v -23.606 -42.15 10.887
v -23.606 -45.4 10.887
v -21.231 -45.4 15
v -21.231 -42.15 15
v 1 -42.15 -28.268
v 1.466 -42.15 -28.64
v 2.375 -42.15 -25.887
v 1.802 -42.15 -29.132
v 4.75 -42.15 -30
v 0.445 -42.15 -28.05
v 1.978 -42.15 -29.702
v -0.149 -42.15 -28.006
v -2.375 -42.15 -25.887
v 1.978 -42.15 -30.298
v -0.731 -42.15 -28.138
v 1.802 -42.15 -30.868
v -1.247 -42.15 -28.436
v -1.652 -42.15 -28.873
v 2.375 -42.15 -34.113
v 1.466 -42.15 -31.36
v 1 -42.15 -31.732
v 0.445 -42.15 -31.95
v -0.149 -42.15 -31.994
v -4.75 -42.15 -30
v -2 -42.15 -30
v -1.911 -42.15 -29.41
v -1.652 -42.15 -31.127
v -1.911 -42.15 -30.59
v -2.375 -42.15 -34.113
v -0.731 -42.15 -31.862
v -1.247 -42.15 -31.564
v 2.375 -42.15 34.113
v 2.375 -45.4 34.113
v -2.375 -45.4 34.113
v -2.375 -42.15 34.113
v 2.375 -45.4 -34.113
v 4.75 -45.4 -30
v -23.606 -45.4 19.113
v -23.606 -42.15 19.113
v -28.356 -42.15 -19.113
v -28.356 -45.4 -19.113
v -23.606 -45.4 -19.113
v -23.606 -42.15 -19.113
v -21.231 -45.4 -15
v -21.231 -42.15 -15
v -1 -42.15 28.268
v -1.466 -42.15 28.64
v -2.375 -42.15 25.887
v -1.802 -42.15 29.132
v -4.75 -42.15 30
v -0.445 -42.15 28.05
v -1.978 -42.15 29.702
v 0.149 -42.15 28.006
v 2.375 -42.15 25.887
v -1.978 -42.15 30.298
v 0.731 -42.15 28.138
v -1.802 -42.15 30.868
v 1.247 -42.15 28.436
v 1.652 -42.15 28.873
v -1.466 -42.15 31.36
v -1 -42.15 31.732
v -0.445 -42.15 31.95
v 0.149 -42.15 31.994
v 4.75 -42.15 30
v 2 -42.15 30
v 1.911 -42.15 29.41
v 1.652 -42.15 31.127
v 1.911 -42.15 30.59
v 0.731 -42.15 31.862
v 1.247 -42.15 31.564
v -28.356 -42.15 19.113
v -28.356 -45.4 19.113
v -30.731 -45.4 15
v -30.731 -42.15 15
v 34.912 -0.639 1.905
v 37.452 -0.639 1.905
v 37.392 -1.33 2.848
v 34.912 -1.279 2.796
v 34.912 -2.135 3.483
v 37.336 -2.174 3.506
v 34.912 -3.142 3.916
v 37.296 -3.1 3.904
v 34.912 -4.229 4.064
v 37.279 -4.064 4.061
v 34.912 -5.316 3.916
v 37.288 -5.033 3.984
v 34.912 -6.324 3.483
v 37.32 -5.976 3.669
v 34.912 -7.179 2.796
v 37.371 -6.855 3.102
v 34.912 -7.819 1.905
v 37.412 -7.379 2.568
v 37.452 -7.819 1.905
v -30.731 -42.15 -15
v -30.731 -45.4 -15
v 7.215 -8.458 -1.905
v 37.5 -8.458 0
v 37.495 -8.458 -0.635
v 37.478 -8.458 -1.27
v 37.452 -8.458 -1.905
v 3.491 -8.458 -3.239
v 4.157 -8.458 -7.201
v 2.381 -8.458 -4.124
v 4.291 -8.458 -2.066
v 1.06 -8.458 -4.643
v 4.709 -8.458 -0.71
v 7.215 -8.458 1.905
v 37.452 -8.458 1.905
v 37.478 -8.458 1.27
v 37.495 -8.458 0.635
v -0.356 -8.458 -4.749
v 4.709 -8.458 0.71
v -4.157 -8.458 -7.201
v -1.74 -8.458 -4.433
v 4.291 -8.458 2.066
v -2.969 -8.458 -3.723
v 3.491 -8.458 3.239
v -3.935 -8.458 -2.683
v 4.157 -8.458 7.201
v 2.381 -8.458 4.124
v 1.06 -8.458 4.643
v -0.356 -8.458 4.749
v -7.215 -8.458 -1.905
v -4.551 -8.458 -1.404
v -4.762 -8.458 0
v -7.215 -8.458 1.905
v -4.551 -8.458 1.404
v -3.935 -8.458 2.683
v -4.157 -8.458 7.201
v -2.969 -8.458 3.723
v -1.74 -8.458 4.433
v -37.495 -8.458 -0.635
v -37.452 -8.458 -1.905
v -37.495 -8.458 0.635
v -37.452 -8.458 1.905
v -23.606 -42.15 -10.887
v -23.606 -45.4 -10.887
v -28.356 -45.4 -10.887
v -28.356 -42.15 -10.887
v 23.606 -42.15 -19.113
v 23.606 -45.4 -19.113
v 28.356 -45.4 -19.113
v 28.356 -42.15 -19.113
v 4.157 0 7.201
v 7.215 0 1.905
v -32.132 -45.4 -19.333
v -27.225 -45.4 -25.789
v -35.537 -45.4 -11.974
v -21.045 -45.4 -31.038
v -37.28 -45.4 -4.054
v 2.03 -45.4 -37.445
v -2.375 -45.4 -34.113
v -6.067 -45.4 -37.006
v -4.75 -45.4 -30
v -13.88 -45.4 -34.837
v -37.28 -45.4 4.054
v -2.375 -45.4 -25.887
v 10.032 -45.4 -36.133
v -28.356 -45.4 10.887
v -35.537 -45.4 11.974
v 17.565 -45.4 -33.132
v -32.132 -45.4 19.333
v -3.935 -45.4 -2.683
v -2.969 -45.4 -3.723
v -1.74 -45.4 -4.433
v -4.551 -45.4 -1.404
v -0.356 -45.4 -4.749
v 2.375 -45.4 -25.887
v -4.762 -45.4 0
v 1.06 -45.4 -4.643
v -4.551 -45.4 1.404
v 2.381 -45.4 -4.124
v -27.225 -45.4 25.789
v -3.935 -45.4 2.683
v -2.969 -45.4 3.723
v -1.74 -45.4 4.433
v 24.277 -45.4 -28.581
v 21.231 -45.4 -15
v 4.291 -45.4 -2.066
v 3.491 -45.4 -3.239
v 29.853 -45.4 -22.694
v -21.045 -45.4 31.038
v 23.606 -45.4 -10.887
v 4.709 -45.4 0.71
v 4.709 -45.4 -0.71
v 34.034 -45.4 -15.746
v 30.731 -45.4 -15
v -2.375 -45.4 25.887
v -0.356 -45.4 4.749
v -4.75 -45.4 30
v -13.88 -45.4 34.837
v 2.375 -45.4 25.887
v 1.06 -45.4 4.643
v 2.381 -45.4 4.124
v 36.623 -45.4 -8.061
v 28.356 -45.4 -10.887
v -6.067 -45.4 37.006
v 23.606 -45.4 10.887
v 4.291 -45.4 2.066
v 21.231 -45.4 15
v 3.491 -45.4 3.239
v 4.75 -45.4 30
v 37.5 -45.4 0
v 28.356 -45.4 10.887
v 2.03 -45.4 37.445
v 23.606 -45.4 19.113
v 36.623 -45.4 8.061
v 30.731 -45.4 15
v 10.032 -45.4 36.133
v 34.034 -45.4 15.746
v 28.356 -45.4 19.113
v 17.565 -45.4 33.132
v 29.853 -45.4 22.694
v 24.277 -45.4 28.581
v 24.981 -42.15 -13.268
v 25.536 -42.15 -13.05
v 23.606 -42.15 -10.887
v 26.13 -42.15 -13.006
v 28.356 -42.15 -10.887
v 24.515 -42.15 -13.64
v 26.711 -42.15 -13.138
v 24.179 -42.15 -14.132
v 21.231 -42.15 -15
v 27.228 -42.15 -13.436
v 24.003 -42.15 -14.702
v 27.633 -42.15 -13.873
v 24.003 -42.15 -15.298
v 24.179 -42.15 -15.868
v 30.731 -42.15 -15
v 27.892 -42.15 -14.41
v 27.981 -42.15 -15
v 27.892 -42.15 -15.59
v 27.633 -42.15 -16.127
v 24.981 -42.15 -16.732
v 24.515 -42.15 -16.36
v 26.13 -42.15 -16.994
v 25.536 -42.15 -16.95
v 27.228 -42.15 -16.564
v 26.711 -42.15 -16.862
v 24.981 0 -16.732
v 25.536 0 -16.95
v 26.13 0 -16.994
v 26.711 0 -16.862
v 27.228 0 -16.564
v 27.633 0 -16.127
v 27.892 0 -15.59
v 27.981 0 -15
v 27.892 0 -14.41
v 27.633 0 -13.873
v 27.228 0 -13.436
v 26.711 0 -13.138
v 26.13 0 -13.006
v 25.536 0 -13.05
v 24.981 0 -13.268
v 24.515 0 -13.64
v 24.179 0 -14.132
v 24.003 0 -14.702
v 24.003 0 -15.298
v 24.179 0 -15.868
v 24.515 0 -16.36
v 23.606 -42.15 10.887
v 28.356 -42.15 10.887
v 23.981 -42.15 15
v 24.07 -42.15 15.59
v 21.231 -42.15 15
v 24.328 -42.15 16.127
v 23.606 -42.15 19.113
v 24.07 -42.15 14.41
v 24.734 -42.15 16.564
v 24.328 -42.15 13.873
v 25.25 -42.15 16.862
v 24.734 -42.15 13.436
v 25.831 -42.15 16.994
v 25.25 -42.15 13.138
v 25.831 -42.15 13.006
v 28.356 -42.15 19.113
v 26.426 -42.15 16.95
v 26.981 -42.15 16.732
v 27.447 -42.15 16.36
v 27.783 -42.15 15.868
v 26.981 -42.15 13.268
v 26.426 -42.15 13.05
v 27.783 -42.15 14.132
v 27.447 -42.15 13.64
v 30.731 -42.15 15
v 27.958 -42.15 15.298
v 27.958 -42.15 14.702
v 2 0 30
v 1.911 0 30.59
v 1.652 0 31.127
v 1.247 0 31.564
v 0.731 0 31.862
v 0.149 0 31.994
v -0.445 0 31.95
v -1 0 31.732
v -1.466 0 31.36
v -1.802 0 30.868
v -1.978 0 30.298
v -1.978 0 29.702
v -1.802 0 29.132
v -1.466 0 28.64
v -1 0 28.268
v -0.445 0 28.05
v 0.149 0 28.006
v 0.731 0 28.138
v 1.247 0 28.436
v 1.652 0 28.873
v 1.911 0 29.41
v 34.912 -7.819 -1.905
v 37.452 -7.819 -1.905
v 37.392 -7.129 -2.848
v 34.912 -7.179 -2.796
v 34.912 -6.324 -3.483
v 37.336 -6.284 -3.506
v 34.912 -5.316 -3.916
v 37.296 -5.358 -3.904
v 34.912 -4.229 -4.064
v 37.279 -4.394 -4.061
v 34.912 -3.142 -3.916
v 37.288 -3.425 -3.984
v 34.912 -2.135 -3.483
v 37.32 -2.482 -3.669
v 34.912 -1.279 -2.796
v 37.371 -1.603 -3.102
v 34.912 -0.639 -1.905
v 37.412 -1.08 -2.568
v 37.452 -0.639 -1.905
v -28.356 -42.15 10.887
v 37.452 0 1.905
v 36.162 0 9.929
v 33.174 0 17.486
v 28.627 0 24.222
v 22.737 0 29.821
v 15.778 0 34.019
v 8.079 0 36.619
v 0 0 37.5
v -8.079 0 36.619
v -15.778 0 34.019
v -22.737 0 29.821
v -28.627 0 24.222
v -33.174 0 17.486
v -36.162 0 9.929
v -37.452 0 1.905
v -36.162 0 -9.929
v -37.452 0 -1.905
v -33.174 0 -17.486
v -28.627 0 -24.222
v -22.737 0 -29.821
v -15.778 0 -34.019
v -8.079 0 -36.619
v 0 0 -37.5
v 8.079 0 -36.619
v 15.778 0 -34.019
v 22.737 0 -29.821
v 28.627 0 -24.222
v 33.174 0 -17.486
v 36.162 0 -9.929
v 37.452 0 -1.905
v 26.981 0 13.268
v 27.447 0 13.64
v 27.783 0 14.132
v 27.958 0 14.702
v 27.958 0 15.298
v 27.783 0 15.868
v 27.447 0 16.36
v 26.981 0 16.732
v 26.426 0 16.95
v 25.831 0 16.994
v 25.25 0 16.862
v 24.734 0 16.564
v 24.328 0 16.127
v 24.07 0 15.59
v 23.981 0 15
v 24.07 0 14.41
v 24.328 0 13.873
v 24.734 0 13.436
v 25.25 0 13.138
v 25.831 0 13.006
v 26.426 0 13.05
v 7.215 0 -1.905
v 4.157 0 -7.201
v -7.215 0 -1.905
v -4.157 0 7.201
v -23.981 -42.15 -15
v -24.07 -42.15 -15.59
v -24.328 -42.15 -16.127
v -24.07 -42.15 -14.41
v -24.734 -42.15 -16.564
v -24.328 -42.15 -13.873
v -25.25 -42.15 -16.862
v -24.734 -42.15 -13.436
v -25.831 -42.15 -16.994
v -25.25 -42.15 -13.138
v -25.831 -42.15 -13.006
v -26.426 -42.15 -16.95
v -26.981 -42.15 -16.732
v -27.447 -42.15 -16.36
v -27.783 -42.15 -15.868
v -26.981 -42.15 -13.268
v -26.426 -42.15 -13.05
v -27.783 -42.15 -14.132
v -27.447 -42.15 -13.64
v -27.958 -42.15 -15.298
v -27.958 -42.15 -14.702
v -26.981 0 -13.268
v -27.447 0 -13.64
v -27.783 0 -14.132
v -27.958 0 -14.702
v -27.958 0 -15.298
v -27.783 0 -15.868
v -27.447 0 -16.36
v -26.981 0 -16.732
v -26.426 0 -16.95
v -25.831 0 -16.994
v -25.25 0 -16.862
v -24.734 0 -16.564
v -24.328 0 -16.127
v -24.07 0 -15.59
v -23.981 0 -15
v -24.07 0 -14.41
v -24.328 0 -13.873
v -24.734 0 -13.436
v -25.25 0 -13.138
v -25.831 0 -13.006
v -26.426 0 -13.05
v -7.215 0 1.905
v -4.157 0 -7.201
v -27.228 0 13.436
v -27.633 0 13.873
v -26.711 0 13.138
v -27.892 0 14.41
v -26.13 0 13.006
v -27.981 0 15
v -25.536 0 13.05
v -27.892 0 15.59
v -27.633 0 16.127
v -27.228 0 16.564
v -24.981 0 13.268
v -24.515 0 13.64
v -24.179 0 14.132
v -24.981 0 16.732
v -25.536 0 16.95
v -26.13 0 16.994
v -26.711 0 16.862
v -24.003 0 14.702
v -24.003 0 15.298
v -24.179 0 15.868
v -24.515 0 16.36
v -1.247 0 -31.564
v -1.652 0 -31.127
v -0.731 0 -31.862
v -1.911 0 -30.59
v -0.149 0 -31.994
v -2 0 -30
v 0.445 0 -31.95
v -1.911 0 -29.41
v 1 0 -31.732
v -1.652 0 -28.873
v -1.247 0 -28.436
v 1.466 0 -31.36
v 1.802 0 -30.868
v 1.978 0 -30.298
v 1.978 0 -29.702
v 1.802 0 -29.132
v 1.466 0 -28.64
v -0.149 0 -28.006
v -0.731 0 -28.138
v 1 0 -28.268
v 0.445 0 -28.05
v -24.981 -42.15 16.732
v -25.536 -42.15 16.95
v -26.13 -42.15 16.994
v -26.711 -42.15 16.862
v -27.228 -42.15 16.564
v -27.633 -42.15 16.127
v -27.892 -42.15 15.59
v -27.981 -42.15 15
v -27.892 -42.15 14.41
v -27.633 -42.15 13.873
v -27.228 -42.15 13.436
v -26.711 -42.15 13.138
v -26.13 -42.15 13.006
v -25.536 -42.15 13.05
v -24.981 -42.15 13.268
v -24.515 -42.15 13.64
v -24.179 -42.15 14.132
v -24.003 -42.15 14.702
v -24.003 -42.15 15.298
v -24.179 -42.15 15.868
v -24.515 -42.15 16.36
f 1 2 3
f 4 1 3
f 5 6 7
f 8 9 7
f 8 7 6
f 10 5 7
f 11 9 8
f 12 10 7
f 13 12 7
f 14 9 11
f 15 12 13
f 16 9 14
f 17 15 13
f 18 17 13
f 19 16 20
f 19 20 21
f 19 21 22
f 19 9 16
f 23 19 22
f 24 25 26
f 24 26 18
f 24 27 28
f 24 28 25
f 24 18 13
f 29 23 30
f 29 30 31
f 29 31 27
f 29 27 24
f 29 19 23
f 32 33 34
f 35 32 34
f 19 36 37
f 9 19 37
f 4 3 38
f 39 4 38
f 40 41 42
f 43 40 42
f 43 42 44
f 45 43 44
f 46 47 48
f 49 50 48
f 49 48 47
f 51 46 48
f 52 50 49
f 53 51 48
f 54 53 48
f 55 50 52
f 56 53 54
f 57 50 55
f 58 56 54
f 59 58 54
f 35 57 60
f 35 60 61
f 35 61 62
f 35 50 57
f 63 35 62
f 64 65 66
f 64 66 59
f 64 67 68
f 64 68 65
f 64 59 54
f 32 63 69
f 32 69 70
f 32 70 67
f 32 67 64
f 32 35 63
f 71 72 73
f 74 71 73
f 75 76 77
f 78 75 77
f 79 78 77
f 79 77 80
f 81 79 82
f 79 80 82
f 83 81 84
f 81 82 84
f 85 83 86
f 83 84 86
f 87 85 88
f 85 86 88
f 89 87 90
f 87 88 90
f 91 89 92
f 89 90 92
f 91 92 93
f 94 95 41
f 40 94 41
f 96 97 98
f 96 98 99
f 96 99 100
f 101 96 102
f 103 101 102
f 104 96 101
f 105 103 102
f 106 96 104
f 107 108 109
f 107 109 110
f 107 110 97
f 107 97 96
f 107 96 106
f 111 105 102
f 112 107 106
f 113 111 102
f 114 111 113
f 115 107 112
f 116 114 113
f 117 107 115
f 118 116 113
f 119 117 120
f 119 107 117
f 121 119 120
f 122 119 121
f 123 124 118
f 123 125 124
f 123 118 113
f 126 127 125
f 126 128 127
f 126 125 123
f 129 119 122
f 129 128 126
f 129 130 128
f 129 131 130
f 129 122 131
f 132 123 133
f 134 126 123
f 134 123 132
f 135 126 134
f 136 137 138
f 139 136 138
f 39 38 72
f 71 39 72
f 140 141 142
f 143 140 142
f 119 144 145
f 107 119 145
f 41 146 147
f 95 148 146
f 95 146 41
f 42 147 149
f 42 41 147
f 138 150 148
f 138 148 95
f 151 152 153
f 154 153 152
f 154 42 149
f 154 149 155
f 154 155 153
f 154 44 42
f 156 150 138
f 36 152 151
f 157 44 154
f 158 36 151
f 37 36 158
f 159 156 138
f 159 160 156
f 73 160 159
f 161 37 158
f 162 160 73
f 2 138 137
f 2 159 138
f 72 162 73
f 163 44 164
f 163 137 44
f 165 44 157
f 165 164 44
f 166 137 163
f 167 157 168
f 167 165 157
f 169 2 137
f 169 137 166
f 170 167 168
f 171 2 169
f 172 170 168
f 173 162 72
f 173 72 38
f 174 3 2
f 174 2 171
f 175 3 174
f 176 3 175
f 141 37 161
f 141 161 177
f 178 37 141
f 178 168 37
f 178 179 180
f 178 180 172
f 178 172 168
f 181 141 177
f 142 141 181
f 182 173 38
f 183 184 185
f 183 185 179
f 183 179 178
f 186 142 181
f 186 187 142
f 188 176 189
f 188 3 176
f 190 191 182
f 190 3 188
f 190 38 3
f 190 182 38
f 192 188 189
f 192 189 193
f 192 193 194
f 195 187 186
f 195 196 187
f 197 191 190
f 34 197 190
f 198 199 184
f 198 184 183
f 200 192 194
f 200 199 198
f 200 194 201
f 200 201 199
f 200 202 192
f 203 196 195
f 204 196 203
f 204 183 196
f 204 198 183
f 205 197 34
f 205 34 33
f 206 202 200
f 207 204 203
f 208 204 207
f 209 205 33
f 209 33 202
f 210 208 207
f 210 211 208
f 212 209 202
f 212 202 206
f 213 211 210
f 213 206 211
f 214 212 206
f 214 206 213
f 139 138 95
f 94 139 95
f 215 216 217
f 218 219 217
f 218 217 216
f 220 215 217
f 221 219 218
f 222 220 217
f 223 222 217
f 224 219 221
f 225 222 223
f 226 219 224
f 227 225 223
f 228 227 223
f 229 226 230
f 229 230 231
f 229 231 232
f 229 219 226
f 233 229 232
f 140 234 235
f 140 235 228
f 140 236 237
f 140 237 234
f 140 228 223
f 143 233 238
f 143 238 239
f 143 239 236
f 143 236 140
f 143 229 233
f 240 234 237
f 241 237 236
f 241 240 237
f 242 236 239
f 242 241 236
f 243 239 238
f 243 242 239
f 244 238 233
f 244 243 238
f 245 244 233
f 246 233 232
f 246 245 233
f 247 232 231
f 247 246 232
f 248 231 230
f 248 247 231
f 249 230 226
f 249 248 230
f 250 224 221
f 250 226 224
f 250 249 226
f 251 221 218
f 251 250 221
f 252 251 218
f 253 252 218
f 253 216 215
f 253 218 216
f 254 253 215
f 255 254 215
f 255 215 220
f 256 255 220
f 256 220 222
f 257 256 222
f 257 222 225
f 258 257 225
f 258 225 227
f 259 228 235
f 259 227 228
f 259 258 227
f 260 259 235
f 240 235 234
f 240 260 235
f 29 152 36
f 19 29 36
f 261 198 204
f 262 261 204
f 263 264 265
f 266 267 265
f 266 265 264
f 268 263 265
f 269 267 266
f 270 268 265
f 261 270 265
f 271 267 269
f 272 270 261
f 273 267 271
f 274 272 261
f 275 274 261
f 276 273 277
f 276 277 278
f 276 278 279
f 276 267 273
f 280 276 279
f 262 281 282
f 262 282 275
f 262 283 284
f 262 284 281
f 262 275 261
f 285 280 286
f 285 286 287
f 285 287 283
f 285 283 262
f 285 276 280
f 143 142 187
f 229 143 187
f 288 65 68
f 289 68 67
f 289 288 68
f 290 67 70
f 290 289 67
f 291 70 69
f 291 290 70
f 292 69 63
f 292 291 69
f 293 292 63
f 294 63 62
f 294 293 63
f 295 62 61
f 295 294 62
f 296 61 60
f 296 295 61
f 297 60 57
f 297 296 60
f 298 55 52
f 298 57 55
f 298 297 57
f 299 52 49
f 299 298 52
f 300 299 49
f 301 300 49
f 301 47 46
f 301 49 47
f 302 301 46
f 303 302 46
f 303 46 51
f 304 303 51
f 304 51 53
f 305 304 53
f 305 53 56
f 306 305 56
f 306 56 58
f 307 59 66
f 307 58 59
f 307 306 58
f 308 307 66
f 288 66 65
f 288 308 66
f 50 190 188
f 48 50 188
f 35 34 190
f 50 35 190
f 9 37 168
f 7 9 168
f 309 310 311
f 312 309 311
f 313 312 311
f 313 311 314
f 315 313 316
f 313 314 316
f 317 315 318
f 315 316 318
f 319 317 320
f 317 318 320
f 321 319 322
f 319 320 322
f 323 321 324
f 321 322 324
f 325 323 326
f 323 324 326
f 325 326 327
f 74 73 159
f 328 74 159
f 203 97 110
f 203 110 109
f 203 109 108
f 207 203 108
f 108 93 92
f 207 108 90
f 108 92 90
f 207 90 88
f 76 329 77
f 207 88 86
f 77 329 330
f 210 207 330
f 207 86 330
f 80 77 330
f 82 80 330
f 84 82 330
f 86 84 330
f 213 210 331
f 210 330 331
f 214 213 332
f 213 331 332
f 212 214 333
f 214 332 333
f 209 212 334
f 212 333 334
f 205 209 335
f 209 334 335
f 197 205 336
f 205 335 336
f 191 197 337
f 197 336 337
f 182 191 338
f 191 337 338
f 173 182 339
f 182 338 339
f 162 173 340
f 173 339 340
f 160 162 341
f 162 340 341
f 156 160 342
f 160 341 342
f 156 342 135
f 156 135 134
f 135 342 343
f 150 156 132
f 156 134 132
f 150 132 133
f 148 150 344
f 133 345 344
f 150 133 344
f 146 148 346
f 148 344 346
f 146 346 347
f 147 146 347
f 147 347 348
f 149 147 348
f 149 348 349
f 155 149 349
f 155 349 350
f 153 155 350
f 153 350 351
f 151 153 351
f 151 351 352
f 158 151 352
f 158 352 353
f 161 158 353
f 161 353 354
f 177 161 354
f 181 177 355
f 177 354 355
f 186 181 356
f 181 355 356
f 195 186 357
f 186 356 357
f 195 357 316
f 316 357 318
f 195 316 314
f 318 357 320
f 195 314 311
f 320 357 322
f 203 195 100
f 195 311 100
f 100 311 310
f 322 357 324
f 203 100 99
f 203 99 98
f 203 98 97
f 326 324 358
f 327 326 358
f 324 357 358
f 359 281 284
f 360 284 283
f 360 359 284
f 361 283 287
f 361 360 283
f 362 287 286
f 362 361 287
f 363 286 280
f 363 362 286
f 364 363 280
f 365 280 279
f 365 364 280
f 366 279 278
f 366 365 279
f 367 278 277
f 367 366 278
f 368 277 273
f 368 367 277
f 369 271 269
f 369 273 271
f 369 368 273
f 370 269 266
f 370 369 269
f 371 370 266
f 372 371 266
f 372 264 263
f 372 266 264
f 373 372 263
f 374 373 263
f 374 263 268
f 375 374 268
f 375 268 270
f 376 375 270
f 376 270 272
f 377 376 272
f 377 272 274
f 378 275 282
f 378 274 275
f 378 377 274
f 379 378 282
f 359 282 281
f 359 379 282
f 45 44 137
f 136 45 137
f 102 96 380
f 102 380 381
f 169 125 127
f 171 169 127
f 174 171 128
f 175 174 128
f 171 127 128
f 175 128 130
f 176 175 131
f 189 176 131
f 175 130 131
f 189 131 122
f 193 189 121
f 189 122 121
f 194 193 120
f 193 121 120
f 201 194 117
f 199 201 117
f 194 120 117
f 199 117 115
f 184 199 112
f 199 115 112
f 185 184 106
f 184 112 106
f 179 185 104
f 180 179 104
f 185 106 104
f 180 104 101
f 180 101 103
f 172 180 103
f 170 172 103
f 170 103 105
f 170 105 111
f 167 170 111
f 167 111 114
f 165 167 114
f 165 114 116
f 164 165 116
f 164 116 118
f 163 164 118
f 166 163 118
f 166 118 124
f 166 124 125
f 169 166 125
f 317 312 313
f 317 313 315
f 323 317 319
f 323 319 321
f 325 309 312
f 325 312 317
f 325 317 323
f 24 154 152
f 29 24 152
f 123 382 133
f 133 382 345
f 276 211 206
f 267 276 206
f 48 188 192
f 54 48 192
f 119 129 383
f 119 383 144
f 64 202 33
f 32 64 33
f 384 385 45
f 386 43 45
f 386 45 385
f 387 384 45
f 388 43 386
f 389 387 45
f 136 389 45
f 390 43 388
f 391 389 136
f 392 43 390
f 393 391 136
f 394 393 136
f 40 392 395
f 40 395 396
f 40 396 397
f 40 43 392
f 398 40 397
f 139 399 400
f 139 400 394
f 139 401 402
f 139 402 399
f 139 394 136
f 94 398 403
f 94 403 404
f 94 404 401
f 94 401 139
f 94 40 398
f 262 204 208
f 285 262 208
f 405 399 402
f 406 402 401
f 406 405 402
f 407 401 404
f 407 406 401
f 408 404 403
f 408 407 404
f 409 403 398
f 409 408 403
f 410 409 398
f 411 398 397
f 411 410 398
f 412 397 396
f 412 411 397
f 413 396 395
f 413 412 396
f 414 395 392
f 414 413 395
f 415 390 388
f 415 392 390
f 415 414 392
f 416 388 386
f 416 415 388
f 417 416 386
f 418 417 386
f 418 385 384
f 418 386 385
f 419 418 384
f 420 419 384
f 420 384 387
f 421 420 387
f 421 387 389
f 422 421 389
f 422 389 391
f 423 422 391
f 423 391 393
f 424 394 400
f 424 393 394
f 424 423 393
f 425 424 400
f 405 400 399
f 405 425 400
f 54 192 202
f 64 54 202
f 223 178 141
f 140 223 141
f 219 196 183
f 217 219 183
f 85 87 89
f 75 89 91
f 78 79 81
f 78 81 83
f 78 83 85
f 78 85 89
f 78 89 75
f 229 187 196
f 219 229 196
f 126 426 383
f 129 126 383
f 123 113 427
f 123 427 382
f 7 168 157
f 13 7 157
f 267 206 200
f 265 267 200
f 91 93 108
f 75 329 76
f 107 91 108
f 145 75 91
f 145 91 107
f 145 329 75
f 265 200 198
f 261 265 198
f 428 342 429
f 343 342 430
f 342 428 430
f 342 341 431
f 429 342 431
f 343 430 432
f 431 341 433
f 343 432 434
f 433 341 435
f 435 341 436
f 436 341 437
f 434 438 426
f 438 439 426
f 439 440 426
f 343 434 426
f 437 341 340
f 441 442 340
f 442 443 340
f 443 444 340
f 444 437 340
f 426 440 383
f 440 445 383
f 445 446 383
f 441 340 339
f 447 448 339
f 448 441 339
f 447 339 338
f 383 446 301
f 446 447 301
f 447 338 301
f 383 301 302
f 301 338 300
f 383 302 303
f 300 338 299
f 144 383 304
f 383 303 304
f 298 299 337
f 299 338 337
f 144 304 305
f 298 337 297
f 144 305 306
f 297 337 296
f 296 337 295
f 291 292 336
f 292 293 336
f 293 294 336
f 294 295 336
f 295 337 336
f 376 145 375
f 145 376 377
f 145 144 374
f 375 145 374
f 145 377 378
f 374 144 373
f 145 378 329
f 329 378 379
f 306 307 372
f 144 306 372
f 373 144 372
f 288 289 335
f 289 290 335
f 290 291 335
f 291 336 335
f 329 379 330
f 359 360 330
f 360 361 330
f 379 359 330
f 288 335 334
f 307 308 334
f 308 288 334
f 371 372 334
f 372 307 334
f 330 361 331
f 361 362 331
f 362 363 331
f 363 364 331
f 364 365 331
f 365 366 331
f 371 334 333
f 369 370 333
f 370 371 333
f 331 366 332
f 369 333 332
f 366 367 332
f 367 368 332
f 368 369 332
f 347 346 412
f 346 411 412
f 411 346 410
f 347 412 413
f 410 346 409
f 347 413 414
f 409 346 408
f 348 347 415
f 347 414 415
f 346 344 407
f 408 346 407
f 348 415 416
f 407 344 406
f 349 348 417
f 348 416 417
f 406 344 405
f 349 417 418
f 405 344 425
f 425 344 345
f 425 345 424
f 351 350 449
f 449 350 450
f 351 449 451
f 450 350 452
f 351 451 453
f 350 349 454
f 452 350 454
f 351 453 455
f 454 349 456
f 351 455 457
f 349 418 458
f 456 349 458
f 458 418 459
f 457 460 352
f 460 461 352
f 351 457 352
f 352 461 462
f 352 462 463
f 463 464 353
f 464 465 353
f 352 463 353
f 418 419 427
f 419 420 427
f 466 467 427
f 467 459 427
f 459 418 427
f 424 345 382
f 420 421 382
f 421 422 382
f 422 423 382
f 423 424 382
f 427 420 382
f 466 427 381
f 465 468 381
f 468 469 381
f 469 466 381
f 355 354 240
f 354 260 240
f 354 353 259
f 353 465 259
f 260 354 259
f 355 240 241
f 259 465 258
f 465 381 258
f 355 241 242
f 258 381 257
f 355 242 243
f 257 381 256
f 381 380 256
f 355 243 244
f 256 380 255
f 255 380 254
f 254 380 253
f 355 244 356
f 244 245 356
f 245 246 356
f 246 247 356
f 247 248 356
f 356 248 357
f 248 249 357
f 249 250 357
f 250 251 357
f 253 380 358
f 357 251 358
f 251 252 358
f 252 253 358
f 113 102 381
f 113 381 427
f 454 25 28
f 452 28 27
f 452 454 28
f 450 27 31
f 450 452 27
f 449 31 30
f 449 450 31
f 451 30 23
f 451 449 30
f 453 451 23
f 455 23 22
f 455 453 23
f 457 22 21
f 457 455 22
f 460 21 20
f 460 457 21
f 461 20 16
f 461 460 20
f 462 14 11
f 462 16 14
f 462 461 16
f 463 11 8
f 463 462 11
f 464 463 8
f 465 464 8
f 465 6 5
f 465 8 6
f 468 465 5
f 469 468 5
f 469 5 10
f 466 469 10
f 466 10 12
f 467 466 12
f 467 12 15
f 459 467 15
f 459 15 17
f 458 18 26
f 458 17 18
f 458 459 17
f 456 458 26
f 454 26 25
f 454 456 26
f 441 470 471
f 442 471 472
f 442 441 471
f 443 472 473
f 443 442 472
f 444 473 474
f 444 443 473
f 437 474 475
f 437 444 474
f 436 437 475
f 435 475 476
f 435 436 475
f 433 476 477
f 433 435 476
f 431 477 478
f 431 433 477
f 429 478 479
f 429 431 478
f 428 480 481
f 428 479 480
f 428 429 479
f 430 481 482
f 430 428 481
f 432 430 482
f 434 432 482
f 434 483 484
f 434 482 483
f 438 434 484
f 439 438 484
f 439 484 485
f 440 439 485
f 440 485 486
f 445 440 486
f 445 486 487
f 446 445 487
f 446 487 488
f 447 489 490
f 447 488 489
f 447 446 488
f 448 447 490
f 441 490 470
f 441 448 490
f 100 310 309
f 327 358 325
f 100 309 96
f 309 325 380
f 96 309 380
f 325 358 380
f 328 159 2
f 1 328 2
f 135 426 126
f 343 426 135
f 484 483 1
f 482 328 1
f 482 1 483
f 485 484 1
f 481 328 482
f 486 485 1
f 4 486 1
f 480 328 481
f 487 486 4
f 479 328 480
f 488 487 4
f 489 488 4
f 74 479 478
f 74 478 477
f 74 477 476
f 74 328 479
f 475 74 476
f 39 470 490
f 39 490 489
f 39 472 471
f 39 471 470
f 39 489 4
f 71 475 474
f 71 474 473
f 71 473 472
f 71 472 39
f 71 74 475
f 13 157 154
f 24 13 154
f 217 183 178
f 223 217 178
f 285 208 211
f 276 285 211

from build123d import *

# Parameters (mm, degrees)
F0_R            = 37.5
F1_DEPTH        = 45.4
F2_R            = 2
F3_DEPTH        = 45.401
F3_COPIES_COUNT = 6
F5_DEPTH        = 3.25
F5_COPIES_COUNT = 6
F7_DEPTH        = 8.4582
F8_W            = 76.2
F8_H            = 3.81
F9_DEPTH        = 8.4582
F11_R           = 4.064
F12_DEPTH       = 2.54
F13_R           = 4.7625
F14_DEPTH       = 36.9428001


# Not quite as in the source:
# - a pattern or mirror of a feature is missing from the dataset's text; its kind, count and spacing are read off the source's solid


with BuildPart() as f1:
    # F0 (on Front) → F1 (new body)
    with BuildSketch(Plane.XZ):
        Circle(F0_R)
    extrude(amount=F1_DEPTH)

    # F2 (on Front) → F3 (cut, through all)
    with BuildSketch(Plane.XZ):
        with Locations((0, 30)):
            Circle(F2_R)
    f3 = extrude(amount=F3_DEPTH, mode=Mode.SUBTRACT)

    # F3_copies: F3 ×6 about axis
    f3_copies_axis = Axis((0, 0, 0), (0, 1, 0))
    for i in range(1, F3_COPIES_COUNT):
        add(f3.rotate(f3_copies_axis, i * 360 / F3_COPIES_COUNT), mode=Mode.SUBTRACT)

    # F4 (on face) → F5 (cut)
    with BuildSketch(Plane.XZ.offset(45.4)):
        Polygon((2.3749, 34.1134474629), (-2.3749, 34.1134474629), (-4.7498, 30), (-2.3749, 25.8865525371), (2.3749, 25.8865525371), (4.7498, 30), align=None)
    f5 = extrude(amount=-F5_DEPTH, mode=Mode.SUBTRACT)

    # F5_copies: F5 ×6 about axis
    f5_copies_axis = Axis((0, 0, 0), (0, 1, 0))
    for i in range(1, F5_COPIES_COUNT):
        add(f5.rotate(f5_copies_axis, i * 360 / F5_COPIES_COUNT), mode=Mode.SUBTRACT)

    # F6 (on face) → F7 (cut)
    with BuildSketch(Plane(origin=(0, 0, 0), x_dir=(-1, 0, 0), z_dir=(0, 1, 0))):
        Polygon((-4.1574415534, -7.2009), (4.1574415534, -7.2009), (8.3148831068, 0), (4.1574415534, 7.2009), (-4.1574415534, 7.2009), (-8.3148831068, 0), align=None)
    extrude(amount=-F7_DEPTH, mode=Mode.SUBTRACT)

    # F8 (on face) → F9 (cut, through all)
    with BuildSketch(Plane(origin=(0, 0, 0), x_dir=(-1, 0, 0), z_dir=(0, 1, 0))):
        Rectangle(F8_W, F8_H)
    extrude(amount=-F9_DEPTH, mode=Mode.SUBTRACT)

    # F11 (on 3pt) → F12 (cut)
    with BuildSketch(Plane.YZ.offset(37.4515817423)):
        with Locations((-4.2291, 0)):
            Circle(F11_R)
    extrude(amount=-F12_DEPTH, mode=Mode.SUBTRACT)

    # F13 (on face) → F14 (cut, through all)
    with BuildSketch(Plane(origin=(0, -8.4582, 0), x_dir=(-1, 0, 0), z_dir=(0, 1, 0))):
        Circle(F13_R)
    extrude(amount=-F14_DEPTH, mode=Mode.SUBTRACT)


solid = f1.part
